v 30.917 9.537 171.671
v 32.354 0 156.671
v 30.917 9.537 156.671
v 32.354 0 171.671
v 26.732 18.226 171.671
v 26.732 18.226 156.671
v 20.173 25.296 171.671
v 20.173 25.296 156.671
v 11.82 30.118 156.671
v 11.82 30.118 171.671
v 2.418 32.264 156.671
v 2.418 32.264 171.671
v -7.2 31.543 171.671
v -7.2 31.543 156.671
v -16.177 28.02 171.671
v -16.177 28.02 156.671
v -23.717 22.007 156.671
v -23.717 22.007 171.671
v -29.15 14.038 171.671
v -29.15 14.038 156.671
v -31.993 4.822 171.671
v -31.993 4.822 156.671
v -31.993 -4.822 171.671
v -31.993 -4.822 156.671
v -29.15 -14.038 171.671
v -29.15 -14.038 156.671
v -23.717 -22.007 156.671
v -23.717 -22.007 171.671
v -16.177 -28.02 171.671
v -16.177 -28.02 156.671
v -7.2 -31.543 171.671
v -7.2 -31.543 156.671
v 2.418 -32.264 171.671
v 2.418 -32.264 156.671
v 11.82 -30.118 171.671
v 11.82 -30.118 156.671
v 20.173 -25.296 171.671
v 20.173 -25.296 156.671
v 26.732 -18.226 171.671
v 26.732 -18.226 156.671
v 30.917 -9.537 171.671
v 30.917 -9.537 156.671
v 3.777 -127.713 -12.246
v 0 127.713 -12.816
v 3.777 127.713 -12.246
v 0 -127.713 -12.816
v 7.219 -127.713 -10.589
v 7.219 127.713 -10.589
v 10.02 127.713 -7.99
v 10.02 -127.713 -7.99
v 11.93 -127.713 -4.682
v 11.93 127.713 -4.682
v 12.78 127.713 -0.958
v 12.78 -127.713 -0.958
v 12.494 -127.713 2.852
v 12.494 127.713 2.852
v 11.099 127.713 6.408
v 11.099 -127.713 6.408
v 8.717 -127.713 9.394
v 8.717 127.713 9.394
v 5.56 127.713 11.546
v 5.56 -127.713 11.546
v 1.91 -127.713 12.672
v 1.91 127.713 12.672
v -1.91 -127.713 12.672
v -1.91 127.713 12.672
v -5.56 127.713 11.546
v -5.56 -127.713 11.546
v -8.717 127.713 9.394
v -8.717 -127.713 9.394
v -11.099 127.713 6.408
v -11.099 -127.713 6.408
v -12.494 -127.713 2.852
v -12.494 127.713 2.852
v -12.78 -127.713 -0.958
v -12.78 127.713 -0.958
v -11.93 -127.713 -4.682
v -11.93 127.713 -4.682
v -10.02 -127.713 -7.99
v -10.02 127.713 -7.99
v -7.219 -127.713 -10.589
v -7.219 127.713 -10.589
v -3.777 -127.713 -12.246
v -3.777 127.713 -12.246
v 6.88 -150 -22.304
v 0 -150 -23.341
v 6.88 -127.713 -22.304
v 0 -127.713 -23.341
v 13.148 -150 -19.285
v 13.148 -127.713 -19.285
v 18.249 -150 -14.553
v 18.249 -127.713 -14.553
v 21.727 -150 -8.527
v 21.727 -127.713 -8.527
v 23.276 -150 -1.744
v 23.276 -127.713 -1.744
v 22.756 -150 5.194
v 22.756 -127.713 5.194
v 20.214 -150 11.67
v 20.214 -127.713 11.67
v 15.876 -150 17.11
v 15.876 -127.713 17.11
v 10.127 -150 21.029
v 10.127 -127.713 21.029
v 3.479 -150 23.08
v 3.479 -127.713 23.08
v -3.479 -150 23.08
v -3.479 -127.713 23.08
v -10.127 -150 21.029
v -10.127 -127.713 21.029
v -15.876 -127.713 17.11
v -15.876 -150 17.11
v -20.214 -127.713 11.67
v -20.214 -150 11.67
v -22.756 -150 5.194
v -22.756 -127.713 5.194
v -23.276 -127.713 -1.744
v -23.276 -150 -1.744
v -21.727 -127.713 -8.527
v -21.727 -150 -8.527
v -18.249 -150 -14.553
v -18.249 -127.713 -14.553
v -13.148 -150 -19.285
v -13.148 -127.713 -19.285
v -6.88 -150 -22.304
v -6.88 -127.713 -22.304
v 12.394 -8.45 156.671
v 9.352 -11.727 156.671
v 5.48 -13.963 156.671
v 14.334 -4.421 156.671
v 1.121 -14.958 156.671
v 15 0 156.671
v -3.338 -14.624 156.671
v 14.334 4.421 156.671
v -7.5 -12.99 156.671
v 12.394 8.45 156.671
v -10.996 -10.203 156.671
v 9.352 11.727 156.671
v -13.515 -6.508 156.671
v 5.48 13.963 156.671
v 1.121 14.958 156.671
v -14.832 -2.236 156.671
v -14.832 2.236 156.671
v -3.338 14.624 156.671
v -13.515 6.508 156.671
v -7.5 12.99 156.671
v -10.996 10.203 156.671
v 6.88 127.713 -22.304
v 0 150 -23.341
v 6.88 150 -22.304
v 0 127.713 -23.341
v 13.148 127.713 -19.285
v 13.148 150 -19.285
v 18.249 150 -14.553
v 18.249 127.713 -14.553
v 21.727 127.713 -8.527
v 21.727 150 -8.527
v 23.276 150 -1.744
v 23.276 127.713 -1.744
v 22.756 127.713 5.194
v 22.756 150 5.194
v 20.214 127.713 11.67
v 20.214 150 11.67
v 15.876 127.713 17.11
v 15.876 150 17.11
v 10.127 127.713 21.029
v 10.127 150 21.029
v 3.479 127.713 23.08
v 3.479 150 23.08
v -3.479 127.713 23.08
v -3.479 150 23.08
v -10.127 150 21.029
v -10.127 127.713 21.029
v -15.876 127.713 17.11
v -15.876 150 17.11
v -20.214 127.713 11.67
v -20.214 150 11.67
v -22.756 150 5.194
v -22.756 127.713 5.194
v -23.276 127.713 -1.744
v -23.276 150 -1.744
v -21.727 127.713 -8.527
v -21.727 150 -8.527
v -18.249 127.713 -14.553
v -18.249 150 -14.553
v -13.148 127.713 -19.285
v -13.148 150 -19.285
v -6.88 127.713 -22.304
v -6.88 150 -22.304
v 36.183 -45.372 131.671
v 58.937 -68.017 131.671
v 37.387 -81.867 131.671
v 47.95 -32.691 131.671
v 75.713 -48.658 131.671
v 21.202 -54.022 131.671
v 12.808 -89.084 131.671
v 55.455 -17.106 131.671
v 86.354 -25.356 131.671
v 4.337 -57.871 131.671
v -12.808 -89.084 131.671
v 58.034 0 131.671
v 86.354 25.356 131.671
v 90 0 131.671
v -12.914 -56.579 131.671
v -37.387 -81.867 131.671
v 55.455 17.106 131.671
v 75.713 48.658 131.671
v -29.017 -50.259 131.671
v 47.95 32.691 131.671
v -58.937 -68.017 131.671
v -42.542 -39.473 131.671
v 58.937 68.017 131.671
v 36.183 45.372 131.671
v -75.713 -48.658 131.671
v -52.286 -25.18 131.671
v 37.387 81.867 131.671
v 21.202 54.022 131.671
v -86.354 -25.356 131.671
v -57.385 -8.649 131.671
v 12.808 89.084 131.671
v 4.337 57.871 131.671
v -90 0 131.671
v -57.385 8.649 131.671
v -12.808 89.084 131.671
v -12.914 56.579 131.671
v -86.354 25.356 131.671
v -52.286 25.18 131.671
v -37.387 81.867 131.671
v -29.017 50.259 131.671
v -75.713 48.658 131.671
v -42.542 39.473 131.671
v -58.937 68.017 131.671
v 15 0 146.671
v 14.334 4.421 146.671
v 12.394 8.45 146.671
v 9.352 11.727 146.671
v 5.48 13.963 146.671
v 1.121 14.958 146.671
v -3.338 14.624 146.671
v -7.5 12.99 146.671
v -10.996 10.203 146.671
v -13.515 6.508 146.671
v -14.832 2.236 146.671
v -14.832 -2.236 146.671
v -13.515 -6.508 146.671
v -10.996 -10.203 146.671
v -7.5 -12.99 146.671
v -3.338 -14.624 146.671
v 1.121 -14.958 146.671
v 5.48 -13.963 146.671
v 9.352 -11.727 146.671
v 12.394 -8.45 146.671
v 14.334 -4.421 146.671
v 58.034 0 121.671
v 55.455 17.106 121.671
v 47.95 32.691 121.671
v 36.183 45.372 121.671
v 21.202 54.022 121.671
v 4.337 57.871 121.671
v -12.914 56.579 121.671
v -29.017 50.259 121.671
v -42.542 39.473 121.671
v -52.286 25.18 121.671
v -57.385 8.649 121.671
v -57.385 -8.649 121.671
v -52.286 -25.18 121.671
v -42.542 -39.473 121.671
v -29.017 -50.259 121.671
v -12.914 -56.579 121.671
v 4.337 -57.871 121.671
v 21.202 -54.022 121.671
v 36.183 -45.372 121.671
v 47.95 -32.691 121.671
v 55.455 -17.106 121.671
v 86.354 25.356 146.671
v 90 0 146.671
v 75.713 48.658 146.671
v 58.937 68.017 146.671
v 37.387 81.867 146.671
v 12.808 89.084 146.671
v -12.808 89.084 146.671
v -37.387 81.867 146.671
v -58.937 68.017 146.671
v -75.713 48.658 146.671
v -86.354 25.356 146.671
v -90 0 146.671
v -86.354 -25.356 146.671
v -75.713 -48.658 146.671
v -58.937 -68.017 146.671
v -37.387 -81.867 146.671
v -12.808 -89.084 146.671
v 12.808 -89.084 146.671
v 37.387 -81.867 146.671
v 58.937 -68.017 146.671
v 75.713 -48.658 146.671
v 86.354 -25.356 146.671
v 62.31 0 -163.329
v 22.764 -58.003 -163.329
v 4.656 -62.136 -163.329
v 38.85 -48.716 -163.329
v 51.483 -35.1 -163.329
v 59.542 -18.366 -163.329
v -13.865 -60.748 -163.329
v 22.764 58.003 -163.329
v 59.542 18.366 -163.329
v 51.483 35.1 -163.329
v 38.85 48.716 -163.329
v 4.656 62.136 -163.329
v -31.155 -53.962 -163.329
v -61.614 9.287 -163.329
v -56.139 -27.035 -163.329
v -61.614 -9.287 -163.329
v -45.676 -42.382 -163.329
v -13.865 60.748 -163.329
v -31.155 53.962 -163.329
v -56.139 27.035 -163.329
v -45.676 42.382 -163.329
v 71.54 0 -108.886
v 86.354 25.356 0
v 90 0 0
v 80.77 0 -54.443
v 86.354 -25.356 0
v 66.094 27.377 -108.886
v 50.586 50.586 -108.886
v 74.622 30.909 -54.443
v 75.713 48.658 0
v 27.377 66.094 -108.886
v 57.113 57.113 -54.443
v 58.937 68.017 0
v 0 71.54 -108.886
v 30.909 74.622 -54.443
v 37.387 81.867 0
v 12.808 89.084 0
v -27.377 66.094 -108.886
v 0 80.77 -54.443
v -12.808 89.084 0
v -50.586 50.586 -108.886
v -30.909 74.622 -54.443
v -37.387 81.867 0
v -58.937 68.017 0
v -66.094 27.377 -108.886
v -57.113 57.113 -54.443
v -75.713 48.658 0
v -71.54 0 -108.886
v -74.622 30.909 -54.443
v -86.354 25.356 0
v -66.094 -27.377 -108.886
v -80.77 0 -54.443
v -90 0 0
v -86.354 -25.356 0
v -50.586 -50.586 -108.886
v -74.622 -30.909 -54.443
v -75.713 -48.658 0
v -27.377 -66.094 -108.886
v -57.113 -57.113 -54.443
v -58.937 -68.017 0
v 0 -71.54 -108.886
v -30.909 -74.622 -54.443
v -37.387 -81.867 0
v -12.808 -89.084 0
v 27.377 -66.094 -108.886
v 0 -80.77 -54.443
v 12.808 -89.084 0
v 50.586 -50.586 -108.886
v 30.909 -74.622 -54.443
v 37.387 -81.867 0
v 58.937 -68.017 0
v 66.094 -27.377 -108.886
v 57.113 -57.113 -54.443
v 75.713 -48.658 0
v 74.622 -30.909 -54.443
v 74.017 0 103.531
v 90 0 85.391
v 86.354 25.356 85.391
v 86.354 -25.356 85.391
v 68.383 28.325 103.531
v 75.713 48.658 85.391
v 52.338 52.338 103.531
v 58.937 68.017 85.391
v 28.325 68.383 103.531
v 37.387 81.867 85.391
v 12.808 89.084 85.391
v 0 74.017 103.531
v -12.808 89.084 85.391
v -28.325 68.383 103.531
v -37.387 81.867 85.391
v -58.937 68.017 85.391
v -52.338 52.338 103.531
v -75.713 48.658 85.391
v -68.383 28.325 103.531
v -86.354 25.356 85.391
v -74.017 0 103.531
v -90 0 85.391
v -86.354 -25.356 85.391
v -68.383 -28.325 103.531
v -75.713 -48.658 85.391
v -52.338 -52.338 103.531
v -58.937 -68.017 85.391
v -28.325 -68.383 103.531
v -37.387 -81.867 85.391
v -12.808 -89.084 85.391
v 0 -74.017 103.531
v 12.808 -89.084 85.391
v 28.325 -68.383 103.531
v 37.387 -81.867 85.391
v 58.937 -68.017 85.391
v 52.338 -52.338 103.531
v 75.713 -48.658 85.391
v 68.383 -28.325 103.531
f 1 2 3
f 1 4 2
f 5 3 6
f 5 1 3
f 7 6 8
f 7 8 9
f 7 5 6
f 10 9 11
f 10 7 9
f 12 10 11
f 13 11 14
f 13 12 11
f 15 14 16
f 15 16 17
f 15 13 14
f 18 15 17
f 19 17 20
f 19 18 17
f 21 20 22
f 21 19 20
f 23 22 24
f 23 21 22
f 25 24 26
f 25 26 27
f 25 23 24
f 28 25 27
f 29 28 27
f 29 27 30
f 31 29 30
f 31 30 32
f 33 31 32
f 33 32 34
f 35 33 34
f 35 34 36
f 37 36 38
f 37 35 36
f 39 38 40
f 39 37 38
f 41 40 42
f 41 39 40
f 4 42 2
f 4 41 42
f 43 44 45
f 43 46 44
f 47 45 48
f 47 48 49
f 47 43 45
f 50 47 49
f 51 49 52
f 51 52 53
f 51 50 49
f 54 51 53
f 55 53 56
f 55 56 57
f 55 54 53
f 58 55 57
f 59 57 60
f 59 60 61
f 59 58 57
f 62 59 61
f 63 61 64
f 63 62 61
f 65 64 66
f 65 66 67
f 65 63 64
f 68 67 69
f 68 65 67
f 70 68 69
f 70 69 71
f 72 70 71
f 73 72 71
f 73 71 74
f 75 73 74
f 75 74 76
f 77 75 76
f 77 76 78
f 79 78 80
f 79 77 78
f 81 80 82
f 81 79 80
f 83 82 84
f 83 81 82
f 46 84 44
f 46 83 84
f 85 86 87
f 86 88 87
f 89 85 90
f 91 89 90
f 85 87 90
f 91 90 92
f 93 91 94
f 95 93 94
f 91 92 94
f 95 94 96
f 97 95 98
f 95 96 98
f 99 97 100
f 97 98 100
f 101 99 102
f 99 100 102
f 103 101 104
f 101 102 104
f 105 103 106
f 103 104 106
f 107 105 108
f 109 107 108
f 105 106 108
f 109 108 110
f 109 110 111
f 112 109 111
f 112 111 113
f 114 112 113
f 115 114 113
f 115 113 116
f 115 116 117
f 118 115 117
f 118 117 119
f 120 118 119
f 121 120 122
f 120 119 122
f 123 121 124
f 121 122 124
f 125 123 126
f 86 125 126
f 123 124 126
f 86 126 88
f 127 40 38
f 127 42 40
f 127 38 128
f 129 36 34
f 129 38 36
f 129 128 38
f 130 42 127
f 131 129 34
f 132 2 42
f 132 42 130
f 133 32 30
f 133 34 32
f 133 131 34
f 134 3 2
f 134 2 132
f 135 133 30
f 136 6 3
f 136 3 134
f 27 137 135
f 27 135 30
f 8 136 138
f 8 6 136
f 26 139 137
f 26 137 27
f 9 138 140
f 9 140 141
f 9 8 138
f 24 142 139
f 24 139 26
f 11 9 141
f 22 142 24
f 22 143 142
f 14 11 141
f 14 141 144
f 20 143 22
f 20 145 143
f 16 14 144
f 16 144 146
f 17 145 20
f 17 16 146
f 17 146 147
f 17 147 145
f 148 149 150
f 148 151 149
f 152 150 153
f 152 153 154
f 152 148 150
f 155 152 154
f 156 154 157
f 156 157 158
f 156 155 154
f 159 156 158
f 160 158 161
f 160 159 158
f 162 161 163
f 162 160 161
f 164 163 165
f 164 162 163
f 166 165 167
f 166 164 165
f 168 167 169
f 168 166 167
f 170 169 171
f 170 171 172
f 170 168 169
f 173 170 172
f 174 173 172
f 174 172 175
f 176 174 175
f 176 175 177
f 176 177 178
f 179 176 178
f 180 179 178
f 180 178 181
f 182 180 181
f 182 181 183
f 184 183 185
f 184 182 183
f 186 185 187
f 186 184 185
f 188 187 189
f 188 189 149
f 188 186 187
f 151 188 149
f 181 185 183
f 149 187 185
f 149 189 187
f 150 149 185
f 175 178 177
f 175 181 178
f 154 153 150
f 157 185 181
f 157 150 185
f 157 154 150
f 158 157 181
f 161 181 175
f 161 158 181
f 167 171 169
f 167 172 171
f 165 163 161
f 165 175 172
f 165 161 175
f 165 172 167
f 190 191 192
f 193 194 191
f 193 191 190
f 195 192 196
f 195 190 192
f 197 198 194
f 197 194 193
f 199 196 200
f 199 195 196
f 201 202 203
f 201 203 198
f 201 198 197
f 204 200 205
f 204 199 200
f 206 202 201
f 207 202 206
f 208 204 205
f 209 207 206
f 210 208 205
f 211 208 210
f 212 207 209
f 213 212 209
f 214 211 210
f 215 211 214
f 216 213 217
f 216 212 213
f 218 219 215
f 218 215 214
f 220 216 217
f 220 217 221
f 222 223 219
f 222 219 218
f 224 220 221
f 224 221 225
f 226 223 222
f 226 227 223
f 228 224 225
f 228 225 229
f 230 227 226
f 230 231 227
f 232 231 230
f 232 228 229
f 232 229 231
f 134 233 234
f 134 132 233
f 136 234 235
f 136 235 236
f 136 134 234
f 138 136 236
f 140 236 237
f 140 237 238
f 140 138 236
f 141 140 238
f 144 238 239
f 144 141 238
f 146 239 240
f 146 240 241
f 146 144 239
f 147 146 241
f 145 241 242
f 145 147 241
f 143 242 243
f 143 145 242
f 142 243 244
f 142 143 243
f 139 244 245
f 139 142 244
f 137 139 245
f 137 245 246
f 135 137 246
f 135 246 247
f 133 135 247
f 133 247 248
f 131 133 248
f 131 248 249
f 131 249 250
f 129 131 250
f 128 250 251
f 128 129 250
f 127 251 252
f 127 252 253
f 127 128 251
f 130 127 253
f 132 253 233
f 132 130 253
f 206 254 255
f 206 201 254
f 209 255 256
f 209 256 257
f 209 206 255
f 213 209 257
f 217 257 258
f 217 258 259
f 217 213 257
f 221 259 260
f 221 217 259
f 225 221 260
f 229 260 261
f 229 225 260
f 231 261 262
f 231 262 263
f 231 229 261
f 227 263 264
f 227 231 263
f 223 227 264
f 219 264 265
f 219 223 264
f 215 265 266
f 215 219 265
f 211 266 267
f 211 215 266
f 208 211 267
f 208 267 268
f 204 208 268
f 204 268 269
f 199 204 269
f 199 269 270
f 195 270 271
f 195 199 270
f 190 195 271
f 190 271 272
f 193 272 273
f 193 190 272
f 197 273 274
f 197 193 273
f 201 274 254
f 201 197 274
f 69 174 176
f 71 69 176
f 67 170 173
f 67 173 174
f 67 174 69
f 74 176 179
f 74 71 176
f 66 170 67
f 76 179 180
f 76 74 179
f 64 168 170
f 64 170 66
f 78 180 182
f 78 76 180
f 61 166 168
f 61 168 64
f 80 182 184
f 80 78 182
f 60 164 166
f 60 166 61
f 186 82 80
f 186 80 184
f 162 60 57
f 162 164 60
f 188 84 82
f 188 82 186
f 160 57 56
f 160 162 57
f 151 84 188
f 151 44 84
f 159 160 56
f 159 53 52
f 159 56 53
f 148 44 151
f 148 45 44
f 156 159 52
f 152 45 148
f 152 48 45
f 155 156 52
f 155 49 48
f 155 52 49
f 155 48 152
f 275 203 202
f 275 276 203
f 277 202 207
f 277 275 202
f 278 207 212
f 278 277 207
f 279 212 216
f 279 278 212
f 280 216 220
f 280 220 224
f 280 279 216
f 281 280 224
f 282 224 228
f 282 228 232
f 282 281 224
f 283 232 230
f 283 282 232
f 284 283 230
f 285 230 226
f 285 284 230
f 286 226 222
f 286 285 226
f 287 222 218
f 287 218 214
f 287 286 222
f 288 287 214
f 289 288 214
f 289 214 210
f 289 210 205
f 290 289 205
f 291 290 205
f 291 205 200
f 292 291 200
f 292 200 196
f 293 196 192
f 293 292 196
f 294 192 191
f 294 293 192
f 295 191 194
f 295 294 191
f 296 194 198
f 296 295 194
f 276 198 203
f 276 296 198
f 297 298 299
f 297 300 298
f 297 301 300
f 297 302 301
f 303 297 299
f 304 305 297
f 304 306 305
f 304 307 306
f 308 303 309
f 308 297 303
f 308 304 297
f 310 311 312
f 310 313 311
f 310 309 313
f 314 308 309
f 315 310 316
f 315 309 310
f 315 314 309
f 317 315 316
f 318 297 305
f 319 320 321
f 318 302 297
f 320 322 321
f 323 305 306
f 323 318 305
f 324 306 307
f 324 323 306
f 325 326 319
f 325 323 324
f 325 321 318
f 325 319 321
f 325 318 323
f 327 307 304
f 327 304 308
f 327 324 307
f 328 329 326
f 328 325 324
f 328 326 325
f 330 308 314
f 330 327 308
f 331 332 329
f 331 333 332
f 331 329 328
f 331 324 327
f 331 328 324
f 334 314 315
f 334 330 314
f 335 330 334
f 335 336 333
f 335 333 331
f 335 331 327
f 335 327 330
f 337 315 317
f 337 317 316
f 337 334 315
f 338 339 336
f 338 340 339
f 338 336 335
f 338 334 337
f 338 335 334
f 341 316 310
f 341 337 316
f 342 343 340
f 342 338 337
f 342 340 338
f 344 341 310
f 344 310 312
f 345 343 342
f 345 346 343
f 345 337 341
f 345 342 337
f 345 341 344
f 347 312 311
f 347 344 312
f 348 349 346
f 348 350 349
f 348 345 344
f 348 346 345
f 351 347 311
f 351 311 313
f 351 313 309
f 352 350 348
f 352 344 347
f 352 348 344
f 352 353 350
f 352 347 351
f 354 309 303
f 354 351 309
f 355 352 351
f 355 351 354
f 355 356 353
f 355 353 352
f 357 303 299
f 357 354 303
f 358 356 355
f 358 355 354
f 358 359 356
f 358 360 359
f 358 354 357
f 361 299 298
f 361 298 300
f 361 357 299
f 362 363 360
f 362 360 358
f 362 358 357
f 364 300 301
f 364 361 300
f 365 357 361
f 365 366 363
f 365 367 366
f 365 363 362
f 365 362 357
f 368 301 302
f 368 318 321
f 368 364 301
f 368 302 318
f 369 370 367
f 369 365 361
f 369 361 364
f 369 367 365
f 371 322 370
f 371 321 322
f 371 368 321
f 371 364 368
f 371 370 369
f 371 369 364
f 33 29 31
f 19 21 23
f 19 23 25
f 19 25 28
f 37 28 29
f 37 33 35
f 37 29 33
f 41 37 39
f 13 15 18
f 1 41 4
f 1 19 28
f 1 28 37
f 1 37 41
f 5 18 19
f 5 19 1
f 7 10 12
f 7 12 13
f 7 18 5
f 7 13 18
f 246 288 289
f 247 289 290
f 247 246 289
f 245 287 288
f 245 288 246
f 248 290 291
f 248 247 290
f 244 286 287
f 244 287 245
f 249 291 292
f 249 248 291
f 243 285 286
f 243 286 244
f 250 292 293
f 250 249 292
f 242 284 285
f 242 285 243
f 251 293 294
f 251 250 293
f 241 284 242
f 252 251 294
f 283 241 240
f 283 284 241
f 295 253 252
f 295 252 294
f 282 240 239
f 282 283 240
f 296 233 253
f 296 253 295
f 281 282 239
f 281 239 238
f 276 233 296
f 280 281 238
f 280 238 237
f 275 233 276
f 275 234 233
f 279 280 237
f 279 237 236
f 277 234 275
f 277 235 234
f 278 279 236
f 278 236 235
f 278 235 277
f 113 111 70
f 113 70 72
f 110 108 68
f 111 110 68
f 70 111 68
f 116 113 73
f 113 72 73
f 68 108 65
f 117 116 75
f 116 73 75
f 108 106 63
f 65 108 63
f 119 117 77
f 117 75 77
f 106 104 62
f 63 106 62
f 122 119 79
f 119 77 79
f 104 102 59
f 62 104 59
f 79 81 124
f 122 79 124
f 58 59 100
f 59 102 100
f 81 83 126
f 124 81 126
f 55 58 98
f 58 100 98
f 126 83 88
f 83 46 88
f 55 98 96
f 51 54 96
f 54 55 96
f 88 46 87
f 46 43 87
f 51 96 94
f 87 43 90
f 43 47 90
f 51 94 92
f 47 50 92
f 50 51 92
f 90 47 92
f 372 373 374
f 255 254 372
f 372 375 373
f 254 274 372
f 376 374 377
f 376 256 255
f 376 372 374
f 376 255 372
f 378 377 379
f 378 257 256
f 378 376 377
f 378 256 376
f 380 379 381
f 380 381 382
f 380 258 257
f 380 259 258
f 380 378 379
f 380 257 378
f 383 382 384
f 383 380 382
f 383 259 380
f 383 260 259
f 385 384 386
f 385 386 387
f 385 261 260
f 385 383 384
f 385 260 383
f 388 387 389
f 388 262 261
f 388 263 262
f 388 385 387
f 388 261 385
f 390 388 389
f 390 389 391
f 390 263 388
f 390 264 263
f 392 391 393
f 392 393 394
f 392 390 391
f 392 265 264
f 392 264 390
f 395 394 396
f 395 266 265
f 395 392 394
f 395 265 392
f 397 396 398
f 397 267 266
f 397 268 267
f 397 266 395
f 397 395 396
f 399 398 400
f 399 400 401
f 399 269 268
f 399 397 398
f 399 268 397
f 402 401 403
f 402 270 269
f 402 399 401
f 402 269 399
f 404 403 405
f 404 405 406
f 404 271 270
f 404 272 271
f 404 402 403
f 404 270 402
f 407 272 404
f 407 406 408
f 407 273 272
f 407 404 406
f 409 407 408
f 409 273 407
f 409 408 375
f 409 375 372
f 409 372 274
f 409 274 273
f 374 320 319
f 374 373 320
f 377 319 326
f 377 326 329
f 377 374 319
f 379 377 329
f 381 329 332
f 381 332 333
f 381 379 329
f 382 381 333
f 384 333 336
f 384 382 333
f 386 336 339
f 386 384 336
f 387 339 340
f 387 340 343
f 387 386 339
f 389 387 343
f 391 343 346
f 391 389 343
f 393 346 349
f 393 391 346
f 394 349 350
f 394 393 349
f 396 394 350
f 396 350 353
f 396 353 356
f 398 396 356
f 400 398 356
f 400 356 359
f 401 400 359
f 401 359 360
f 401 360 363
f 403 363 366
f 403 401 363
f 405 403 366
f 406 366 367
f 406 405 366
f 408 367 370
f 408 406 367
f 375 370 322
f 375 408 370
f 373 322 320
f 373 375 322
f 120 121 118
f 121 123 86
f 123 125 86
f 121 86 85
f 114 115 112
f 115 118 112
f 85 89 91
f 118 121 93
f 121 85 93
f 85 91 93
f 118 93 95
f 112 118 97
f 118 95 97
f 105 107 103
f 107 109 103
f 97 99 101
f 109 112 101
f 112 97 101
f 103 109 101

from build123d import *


with BuildPart() as f1:
    # F0 (on Front) → F1 (revolve)
    with BuildSketch(Plane.XZ):
        Polygon((0, 171.6705819281), (0, 0), (0, -163.3294180719), (62.310040211, -163.3294180719), (90, 0), (90, 85.3906134428), (58.0335408158, 121.6705819281), (58.0335408158, 131.6705819281), (90, 131.6705819281), (90, 146.6705819281), (15, 146.6705819281), (15, 156.6705819281), (32.3543744587, 156.6705819281), (32.3543744587, 171.6705819281), align=None)
    revolve(axis=Axis((0, 0, 85.8352909641), (0, 0, 1)))


with BuildPart() as f3:
    # F2 (on Right) → F3 (revolve)
    with BuildSketch(Plane.YZ):
        Polygon((0, -12.8155195192), (0, 0), (-127.7133935073, 0), (-150, 0), (-150, -23.3408341183), (-127.7133935073, -23.3408341183), (-127.7133935073, -12.8155195192), align=None)
    revolve(axis=Axis((0, -63.8566967536, 0), (0, -1, 0)))

    # F4: F3 across plane


with BuildPart() as f3_1:
    add(f3.part)
    add(f3.part.mirror(Plane.XZ))


solid = Compound([f1.part, f3_1.part])
